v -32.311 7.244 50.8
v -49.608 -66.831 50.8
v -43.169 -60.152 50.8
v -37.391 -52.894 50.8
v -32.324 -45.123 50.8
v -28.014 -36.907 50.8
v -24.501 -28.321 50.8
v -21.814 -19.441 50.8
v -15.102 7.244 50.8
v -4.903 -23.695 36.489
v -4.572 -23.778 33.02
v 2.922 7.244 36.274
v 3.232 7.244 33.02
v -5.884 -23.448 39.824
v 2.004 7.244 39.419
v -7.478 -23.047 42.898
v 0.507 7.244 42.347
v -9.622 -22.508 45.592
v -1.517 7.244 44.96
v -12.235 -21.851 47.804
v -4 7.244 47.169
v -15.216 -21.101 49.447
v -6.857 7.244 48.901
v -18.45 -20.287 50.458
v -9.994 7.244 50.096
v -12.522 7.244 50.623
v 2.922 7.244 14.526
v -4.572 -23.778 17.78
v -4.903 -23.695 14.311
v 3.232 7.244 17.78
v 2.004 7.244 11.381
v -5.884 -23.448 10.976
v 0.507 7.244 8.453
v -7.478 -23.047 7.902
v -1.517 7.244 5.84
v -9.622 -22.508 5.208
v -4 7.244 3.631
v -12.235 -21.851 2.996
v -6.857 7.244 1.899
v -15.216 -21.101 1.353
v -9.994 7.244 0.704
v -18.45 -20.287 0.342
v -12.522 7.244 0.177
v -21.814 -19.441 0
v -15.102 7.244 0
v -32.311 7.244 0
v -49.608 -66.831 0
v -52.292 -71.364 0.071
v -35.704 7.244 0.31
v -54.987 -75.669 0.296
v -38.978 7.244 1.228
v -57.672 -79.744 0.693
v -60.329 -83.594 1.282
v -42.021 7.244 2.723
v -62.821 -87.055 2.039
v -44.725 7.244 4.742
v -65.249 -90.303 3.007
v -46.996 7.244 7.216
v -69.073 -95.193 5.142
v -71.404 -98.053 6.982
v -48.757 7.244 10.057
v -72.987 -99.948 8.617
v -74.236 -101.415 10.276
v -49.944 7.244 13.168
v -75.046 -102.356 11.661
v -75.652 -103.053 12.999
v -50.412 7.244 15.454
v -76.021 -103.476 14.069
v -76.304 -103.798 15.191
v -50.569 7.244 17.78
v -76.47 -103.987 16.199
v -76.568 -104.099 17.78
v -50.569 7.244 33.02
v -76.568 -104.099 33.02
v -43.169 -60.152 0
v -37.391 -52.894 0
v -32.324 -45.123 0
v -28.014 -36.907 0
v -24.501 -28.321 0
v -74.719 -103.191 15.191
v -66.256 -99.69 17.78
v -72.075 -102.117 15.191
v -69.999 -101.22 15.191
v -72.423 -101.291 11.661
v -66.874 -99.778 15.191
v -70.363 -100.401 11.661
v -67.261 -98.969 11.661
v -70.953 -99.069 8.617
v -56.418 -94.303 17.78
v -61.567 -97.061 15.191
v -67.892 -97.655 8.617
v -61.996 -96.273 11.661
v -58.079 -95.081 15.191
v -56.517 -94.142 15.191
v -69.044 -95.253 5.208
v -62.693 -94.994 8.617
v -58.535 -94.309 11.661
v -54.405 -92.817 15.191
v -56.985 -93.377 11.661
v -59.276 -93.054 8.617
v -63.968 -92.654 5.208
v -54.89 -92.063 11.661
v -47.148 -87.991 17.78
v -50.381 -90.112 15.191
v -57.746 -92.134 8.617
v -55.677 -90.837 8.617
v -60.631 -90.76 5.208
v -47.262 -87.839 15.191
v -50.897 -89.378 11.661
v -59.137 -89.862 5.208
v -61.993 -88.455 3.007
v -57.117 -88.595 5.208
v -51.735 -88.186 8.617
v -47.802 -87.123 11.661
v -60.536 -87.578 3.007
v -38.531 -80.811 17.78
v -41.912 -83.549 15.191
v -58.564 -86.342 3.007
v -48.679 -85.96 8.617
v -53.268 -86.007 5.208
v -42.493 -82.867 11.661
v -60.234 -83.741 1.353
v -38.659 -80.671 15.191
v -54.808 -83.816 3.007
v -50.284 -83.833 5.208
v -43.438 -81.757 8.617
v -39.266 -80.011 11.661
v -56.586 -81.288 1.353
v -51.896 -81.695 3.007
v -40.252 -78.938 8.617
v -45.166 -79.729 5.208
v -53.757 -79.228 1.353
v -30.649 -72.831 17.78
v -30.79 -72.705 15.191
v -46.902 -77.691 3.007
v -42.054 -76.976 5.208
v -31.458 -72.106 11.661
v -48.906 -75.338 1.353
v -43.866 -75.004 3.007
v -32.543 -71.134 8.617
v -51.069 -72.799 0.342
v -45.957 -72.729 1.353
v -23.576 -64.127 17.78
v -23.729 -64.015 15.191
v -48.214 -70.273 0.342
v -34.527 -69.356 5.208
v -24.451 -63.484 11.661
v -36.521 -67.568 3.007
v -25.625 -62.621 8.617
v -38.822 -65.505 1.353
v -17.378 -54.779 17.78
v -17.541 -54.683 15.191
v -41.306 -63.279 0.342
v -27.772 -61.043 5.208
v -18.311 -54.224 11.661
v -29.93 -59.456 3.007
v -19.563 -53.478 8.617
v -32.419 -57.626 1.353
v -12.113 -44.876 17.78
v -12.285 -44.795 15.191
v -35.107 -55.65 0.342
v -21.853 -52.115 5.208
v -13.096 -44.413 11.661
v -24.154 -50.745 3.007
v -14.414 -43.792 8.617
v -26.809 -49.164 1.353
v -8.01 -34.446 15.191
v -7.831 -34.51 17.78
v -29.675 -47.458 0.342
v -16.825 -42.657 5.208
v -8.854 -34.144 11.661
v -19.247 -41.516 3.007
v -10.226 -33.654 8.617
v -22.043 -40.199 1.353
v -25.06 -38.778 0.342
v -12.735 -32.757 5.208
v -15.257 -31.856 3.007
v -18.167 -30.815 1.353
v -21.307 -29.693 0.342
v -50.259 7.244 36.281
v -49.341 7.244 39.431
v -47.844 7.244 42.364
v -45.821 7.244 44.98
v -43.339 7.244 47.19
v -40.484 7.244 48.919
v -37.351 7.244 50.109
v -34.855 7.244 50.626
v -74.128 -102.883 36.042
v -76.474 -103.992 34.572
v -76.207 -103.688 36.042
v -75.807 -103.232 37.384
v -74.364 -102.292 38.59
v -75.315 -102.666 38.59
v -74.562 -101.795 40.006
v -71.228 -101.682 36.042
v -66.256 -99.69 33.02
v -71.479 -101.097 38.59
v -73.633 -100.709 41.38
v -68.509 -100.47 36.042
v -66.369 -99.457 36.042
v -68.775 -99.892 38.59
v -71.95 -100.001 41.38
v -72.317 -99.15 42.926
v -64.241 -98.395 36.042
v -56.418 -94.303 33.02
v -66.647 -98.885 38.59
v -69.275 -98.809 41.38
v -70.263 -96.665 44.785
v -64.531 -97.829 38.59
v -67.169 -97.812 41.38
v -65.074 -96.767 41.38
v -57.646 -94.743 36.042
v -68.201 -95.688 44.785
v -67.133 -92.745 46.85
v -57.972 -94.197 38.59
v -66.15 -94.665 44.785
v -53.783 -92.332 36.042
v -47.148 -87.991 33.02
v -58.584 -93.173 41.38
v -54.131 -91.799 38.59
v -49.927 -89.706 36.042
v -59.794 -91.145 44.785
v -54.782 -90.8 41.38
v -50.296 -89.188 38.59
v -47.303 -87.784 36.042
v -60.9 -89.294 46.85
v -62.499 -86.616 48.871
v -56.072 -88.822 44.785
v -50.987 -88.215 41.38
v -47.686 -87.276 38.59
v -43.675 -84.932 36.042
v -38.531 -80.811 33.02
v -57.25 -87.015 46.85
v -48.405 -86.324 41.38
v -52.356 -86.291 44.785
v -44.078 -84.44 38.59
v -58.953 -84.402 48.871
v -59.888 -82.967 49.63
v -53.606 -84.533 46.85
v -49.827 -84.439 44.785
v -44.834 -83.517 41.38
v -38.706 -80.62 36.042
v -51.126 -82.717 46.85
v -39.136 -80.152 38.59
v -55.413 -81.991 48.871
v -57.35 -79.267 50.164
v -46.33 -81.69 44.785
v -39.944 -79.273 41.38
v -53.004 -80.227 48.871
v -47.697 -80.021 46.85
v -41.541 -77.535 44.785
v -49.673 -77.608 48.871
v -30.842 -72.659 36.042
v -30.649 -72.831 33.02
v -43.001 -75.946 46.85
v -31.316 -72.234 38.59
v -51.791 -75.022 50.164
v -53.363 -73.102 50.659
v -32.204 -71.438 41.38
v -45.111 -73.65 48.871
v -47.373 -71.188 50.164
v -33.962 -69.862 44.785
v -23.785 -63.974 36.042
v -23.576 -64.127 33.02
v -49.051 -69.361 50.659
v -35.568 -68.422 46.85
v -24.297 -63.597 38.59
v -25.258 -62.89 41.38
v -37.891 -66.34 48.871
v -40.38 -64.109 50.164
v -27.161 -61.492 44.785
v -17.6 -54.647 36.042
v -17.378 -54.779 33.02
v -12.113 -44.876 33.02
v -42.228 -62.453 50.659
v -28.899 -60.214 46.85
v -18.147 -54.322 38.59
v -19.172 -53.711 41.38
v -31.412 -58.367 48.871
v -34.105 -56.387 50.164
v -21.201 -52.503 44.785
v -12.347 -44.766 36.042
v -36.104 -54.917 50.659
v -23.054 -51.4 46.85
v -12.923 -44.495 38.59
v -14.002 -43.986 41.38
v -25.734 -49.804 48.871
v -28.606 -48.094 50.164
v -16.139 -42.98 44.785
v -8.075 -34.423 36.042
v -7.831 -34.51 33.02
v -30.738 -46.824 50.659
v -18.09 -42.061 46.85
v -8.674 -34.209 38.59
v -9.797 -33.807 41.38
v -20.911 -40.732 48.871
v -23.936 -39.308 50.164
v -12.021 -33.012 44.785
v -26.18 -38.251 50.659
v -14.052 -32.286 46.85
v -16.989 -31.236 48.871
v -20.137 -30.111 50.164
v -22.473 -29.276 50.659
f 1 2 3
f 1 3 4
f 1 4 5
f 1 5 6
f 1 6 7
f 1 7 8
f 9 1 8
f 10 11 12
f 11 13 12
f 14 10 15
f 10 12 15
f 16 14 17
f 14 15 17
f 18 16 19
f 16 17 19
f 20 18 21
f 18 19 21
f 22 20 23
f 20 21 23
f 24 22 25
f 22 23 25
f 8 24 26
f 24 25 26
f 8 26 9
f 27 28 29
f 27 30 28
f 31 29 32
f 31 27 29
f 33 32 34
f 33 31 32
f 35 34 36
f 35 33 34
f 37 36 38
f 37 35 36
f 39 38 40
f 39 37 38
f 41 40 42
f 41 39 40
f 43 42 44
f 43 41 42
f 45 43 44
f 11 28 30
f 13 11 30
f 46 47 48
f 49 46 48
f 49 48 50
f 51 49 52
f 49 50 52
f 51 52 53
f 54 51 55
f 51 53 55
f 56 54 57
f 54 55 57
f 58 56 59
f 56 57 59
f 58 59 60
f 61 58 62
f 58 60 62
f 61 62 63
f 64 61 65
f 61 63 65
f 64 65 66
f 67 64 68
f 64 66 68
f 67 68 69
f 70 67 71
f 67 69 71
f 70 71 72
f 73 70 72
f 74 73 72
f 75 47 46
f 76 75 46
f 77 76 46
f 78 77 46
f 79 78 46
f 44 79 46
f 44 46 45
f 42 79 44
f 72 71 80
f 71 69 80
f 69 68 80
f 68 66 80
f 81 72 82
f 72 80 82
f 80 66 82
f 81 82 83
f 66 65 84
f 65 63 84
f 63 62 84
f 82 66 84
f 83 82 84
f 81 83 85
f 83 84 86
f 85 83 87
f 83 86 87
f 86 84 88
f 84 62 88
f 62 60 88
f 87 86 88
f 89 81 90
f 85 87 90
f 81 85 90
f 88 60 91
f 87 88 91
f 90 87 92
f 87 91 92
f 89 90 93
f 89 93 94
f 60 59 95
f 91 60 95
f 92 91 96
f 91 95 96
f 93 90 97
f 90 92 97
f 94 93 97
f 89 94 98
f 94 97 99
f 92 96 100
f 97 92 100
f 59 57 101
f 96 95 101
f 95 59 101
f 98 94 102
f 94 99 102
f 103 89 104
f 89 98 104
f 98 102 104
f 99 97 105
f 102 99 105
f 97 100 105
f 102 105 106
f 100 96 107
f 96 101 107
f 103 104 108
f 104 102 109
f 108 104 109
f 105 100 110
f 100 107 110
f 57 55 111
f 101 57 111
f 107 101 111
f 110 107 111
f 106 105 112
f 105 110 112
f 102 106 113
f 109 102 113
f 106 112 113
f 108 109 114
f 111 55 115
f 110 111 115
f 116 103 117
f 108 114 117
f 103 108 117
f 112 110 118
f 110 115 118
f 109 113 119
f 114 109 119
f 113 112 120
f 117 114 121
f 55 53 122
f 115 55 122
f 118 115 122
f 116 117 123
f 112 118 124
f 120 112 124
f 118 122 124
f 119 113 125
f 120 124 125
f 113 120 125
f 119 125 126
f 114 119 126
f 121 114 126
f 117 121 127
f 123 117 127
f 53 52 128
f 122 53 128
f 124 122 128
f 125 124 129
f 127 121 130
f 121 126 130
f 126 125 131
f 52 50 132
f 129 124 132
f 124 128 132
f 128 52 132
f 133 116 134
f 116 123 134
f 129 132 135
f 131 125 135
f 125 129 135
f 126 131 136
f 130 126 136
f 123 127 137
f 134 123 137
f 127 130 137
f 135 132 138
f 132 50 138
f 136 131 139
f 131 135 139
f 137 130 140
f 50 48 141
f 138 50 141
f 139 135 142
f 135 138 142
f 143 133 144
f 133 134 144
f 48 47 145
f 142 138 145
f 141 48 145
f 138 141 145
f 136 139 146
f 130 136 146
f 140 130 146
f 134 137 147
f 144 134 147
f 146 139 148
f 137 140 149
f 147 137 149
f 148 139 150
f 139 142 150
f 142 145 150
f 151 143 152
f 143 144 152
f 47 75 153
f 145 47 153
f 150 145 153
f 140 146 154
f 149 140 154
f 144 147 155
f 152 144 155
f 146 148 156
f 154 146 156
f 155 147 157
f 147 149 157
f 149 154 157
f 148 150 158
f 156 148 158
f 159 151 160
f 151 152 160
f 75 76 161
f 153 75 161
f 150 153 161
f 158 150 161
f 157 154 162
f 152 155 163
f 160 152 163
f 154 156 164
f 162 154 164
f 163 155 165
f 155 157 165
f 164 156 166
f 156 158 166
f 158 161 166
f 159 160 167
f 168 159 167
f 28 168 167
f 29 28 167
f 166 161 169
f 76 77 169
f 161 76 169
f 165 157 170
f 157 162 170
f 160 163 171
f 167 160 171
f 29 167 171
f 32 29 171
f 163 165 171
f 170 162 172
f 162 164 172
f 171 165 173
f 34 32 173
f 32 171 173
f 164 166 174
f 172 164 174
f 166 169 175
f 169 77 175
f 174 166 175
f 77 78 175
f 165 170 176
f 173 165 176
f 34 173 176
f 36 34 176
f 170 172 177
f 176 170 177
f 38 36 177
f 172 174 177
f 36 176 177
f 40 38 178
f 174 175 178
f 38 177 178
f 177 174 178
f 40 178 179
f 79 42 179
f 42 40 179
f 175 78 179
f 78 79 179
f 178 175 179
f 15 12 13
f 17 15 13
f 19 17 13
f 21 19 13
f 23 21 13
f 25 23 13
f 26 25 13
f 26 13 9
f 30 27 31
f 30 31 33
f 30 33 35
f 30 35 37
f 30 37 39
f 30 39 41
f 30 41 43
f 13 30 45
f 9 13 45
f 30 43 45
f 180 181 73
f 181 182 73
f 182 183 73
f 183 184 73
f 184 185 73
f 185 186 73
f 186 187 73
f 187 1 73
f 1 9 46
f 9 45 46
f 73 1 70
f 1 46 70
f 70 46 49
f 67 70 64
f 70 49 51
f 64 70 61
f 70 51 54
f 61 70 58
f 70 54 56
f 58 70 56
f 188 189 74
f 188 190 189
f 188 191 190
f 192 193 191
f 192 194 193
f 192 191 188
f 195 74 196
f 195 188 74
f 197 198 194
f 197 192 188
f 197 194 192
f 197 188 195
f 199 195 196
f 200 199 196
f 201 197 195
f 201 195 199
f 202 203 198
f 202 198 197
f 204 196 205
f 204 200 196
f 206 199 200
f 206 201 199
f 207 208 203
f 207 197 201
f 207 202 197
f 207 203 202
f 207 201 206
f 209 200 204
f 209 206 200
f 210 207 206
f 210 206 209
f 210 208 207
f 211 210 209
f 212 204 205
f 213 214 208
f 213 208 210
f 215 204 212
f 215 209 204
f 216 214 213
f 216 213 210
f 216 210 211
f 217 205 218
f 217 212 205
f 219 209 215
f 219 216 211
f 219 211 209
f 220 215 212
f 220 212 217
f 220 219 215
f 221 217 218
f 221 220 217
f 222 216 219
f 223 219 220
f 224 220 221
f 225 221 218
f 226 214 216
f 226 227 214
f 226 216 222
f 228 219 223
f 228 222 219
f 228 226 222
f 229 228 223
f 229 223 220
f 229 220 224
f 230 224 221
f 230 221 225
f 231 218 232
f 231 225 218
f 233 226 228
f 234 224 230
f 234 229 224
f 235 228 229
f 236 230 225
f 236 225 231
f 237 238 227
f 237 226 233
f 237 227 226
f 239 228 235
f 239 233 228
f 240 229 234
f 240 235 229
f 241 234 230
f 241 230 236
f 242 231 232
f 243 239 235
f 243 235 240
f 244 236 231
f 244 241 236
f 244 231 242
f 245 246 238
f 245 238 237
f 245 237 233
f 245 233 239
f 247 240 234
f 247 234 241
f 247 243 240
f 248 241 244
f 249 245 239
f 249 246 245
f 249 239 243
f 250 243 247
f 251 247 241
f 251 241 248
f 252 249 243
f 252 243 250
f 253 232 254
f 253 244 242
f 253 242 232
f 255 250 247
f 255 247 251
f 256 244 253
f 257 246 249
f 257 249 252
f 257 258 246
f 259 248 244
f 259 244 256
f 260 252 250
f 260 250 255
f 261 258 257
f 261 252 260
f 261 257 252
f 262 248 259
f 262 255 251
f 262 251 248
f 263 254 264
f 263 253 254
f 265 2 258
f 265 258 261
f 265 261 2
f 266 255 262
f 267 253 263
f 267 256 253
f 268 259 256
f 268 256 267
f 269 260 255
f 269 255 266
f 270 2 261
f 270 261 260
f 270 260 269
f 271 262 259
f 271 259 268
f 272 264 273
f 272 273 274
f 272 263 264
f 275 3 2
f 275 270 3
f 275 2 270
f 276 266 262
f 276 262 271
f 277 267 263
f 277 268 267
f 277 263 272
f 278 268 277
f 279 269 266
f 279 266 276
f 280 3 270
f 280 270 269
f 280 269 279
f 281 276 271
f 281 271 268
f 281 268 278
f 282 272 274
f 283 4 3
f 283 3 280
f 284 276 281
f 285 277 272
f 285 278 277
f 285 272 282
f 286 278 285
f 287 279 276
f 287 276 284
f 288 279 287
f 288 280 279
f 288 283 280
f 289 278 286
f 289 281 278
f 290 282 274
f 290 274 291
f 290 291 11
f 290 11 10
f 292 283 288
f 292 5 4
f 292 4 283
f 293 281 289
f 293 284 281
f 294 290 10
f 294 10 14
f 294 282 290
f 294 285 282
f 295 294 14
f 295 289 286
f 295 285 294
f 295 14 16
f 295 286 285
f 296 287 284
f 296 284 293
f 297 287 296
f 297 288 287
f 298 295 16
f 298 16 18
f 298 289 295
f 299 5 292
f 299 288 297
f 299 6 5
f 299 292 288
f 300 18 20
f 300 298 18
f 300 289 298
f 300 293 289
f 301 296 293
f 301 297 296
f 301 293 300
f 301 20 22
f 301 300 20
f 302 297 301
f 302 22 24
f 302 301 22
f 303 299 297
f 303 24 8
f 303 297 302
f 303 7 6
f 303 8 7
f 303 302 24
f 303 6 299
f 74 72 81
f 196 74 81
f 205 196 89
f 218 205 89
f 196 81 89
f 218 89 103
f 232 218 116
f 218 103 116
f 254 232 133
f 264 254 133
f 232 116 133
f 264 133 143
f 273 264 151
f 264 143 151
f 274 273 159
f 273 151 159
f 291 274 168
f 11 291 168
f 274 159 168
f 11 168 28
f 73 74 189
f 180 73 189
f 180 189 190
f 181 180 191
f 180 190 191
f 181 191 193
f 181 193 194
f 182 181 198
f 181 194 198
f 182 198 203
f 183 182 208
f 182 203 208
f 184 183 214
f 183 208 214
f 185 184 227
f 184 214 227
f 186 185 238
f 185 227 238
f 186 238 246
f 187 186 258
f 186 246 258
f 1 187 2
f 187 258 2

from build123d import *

# Parameters (mm, degrees)
F1_DEPTH = 50.8
F2_R     = 17.78
F3_R     = 17.78


# Not quite as in the source:
# - a feature names something its author has since deleted; it is built from what else it names


with BuildPart() as f1:
    # F0 (on Top) → F1 (new body)
    with BuildSketch(Plane.XY):
        with BuildLine():
            Line((3.2321710605, 7.2439061478), (-50.5689829588, 7.2439061478))
            Line((-50.5689829588, 7.2439061478), (-76.5684420406, -104.0992669462))
            ThreePointArc((-76.5684420406, -104.0992669462), (-30.6491711683, -72.8314970086), (-4.5715821907, -23.7783398479))
            Line((-4.5715821907, -23.7783398479), (3.2321710605, 7.2439061478))
        make_face()
    extrude(amount=F1_DEPTH)

    # F2
    f2_edges = [f1.edges().sort_by_distance(p)[0] for p in [
        (-0.669706, -8.267217, 50.8),
        (-63.568712, -48.42768, 50.8),
    ]]
    fillet(f2_edges, radius=F2_R)

    # F3
    f3_edges = [f1.edges().sort_by_distance(p)[0] for p in [
        (-0.669706, -8.267217, 0),
        (-63.568712, -48.42768, 0),
    ]]
    fillet(f3_edges, radius=F3_R)


solid = f1.part
